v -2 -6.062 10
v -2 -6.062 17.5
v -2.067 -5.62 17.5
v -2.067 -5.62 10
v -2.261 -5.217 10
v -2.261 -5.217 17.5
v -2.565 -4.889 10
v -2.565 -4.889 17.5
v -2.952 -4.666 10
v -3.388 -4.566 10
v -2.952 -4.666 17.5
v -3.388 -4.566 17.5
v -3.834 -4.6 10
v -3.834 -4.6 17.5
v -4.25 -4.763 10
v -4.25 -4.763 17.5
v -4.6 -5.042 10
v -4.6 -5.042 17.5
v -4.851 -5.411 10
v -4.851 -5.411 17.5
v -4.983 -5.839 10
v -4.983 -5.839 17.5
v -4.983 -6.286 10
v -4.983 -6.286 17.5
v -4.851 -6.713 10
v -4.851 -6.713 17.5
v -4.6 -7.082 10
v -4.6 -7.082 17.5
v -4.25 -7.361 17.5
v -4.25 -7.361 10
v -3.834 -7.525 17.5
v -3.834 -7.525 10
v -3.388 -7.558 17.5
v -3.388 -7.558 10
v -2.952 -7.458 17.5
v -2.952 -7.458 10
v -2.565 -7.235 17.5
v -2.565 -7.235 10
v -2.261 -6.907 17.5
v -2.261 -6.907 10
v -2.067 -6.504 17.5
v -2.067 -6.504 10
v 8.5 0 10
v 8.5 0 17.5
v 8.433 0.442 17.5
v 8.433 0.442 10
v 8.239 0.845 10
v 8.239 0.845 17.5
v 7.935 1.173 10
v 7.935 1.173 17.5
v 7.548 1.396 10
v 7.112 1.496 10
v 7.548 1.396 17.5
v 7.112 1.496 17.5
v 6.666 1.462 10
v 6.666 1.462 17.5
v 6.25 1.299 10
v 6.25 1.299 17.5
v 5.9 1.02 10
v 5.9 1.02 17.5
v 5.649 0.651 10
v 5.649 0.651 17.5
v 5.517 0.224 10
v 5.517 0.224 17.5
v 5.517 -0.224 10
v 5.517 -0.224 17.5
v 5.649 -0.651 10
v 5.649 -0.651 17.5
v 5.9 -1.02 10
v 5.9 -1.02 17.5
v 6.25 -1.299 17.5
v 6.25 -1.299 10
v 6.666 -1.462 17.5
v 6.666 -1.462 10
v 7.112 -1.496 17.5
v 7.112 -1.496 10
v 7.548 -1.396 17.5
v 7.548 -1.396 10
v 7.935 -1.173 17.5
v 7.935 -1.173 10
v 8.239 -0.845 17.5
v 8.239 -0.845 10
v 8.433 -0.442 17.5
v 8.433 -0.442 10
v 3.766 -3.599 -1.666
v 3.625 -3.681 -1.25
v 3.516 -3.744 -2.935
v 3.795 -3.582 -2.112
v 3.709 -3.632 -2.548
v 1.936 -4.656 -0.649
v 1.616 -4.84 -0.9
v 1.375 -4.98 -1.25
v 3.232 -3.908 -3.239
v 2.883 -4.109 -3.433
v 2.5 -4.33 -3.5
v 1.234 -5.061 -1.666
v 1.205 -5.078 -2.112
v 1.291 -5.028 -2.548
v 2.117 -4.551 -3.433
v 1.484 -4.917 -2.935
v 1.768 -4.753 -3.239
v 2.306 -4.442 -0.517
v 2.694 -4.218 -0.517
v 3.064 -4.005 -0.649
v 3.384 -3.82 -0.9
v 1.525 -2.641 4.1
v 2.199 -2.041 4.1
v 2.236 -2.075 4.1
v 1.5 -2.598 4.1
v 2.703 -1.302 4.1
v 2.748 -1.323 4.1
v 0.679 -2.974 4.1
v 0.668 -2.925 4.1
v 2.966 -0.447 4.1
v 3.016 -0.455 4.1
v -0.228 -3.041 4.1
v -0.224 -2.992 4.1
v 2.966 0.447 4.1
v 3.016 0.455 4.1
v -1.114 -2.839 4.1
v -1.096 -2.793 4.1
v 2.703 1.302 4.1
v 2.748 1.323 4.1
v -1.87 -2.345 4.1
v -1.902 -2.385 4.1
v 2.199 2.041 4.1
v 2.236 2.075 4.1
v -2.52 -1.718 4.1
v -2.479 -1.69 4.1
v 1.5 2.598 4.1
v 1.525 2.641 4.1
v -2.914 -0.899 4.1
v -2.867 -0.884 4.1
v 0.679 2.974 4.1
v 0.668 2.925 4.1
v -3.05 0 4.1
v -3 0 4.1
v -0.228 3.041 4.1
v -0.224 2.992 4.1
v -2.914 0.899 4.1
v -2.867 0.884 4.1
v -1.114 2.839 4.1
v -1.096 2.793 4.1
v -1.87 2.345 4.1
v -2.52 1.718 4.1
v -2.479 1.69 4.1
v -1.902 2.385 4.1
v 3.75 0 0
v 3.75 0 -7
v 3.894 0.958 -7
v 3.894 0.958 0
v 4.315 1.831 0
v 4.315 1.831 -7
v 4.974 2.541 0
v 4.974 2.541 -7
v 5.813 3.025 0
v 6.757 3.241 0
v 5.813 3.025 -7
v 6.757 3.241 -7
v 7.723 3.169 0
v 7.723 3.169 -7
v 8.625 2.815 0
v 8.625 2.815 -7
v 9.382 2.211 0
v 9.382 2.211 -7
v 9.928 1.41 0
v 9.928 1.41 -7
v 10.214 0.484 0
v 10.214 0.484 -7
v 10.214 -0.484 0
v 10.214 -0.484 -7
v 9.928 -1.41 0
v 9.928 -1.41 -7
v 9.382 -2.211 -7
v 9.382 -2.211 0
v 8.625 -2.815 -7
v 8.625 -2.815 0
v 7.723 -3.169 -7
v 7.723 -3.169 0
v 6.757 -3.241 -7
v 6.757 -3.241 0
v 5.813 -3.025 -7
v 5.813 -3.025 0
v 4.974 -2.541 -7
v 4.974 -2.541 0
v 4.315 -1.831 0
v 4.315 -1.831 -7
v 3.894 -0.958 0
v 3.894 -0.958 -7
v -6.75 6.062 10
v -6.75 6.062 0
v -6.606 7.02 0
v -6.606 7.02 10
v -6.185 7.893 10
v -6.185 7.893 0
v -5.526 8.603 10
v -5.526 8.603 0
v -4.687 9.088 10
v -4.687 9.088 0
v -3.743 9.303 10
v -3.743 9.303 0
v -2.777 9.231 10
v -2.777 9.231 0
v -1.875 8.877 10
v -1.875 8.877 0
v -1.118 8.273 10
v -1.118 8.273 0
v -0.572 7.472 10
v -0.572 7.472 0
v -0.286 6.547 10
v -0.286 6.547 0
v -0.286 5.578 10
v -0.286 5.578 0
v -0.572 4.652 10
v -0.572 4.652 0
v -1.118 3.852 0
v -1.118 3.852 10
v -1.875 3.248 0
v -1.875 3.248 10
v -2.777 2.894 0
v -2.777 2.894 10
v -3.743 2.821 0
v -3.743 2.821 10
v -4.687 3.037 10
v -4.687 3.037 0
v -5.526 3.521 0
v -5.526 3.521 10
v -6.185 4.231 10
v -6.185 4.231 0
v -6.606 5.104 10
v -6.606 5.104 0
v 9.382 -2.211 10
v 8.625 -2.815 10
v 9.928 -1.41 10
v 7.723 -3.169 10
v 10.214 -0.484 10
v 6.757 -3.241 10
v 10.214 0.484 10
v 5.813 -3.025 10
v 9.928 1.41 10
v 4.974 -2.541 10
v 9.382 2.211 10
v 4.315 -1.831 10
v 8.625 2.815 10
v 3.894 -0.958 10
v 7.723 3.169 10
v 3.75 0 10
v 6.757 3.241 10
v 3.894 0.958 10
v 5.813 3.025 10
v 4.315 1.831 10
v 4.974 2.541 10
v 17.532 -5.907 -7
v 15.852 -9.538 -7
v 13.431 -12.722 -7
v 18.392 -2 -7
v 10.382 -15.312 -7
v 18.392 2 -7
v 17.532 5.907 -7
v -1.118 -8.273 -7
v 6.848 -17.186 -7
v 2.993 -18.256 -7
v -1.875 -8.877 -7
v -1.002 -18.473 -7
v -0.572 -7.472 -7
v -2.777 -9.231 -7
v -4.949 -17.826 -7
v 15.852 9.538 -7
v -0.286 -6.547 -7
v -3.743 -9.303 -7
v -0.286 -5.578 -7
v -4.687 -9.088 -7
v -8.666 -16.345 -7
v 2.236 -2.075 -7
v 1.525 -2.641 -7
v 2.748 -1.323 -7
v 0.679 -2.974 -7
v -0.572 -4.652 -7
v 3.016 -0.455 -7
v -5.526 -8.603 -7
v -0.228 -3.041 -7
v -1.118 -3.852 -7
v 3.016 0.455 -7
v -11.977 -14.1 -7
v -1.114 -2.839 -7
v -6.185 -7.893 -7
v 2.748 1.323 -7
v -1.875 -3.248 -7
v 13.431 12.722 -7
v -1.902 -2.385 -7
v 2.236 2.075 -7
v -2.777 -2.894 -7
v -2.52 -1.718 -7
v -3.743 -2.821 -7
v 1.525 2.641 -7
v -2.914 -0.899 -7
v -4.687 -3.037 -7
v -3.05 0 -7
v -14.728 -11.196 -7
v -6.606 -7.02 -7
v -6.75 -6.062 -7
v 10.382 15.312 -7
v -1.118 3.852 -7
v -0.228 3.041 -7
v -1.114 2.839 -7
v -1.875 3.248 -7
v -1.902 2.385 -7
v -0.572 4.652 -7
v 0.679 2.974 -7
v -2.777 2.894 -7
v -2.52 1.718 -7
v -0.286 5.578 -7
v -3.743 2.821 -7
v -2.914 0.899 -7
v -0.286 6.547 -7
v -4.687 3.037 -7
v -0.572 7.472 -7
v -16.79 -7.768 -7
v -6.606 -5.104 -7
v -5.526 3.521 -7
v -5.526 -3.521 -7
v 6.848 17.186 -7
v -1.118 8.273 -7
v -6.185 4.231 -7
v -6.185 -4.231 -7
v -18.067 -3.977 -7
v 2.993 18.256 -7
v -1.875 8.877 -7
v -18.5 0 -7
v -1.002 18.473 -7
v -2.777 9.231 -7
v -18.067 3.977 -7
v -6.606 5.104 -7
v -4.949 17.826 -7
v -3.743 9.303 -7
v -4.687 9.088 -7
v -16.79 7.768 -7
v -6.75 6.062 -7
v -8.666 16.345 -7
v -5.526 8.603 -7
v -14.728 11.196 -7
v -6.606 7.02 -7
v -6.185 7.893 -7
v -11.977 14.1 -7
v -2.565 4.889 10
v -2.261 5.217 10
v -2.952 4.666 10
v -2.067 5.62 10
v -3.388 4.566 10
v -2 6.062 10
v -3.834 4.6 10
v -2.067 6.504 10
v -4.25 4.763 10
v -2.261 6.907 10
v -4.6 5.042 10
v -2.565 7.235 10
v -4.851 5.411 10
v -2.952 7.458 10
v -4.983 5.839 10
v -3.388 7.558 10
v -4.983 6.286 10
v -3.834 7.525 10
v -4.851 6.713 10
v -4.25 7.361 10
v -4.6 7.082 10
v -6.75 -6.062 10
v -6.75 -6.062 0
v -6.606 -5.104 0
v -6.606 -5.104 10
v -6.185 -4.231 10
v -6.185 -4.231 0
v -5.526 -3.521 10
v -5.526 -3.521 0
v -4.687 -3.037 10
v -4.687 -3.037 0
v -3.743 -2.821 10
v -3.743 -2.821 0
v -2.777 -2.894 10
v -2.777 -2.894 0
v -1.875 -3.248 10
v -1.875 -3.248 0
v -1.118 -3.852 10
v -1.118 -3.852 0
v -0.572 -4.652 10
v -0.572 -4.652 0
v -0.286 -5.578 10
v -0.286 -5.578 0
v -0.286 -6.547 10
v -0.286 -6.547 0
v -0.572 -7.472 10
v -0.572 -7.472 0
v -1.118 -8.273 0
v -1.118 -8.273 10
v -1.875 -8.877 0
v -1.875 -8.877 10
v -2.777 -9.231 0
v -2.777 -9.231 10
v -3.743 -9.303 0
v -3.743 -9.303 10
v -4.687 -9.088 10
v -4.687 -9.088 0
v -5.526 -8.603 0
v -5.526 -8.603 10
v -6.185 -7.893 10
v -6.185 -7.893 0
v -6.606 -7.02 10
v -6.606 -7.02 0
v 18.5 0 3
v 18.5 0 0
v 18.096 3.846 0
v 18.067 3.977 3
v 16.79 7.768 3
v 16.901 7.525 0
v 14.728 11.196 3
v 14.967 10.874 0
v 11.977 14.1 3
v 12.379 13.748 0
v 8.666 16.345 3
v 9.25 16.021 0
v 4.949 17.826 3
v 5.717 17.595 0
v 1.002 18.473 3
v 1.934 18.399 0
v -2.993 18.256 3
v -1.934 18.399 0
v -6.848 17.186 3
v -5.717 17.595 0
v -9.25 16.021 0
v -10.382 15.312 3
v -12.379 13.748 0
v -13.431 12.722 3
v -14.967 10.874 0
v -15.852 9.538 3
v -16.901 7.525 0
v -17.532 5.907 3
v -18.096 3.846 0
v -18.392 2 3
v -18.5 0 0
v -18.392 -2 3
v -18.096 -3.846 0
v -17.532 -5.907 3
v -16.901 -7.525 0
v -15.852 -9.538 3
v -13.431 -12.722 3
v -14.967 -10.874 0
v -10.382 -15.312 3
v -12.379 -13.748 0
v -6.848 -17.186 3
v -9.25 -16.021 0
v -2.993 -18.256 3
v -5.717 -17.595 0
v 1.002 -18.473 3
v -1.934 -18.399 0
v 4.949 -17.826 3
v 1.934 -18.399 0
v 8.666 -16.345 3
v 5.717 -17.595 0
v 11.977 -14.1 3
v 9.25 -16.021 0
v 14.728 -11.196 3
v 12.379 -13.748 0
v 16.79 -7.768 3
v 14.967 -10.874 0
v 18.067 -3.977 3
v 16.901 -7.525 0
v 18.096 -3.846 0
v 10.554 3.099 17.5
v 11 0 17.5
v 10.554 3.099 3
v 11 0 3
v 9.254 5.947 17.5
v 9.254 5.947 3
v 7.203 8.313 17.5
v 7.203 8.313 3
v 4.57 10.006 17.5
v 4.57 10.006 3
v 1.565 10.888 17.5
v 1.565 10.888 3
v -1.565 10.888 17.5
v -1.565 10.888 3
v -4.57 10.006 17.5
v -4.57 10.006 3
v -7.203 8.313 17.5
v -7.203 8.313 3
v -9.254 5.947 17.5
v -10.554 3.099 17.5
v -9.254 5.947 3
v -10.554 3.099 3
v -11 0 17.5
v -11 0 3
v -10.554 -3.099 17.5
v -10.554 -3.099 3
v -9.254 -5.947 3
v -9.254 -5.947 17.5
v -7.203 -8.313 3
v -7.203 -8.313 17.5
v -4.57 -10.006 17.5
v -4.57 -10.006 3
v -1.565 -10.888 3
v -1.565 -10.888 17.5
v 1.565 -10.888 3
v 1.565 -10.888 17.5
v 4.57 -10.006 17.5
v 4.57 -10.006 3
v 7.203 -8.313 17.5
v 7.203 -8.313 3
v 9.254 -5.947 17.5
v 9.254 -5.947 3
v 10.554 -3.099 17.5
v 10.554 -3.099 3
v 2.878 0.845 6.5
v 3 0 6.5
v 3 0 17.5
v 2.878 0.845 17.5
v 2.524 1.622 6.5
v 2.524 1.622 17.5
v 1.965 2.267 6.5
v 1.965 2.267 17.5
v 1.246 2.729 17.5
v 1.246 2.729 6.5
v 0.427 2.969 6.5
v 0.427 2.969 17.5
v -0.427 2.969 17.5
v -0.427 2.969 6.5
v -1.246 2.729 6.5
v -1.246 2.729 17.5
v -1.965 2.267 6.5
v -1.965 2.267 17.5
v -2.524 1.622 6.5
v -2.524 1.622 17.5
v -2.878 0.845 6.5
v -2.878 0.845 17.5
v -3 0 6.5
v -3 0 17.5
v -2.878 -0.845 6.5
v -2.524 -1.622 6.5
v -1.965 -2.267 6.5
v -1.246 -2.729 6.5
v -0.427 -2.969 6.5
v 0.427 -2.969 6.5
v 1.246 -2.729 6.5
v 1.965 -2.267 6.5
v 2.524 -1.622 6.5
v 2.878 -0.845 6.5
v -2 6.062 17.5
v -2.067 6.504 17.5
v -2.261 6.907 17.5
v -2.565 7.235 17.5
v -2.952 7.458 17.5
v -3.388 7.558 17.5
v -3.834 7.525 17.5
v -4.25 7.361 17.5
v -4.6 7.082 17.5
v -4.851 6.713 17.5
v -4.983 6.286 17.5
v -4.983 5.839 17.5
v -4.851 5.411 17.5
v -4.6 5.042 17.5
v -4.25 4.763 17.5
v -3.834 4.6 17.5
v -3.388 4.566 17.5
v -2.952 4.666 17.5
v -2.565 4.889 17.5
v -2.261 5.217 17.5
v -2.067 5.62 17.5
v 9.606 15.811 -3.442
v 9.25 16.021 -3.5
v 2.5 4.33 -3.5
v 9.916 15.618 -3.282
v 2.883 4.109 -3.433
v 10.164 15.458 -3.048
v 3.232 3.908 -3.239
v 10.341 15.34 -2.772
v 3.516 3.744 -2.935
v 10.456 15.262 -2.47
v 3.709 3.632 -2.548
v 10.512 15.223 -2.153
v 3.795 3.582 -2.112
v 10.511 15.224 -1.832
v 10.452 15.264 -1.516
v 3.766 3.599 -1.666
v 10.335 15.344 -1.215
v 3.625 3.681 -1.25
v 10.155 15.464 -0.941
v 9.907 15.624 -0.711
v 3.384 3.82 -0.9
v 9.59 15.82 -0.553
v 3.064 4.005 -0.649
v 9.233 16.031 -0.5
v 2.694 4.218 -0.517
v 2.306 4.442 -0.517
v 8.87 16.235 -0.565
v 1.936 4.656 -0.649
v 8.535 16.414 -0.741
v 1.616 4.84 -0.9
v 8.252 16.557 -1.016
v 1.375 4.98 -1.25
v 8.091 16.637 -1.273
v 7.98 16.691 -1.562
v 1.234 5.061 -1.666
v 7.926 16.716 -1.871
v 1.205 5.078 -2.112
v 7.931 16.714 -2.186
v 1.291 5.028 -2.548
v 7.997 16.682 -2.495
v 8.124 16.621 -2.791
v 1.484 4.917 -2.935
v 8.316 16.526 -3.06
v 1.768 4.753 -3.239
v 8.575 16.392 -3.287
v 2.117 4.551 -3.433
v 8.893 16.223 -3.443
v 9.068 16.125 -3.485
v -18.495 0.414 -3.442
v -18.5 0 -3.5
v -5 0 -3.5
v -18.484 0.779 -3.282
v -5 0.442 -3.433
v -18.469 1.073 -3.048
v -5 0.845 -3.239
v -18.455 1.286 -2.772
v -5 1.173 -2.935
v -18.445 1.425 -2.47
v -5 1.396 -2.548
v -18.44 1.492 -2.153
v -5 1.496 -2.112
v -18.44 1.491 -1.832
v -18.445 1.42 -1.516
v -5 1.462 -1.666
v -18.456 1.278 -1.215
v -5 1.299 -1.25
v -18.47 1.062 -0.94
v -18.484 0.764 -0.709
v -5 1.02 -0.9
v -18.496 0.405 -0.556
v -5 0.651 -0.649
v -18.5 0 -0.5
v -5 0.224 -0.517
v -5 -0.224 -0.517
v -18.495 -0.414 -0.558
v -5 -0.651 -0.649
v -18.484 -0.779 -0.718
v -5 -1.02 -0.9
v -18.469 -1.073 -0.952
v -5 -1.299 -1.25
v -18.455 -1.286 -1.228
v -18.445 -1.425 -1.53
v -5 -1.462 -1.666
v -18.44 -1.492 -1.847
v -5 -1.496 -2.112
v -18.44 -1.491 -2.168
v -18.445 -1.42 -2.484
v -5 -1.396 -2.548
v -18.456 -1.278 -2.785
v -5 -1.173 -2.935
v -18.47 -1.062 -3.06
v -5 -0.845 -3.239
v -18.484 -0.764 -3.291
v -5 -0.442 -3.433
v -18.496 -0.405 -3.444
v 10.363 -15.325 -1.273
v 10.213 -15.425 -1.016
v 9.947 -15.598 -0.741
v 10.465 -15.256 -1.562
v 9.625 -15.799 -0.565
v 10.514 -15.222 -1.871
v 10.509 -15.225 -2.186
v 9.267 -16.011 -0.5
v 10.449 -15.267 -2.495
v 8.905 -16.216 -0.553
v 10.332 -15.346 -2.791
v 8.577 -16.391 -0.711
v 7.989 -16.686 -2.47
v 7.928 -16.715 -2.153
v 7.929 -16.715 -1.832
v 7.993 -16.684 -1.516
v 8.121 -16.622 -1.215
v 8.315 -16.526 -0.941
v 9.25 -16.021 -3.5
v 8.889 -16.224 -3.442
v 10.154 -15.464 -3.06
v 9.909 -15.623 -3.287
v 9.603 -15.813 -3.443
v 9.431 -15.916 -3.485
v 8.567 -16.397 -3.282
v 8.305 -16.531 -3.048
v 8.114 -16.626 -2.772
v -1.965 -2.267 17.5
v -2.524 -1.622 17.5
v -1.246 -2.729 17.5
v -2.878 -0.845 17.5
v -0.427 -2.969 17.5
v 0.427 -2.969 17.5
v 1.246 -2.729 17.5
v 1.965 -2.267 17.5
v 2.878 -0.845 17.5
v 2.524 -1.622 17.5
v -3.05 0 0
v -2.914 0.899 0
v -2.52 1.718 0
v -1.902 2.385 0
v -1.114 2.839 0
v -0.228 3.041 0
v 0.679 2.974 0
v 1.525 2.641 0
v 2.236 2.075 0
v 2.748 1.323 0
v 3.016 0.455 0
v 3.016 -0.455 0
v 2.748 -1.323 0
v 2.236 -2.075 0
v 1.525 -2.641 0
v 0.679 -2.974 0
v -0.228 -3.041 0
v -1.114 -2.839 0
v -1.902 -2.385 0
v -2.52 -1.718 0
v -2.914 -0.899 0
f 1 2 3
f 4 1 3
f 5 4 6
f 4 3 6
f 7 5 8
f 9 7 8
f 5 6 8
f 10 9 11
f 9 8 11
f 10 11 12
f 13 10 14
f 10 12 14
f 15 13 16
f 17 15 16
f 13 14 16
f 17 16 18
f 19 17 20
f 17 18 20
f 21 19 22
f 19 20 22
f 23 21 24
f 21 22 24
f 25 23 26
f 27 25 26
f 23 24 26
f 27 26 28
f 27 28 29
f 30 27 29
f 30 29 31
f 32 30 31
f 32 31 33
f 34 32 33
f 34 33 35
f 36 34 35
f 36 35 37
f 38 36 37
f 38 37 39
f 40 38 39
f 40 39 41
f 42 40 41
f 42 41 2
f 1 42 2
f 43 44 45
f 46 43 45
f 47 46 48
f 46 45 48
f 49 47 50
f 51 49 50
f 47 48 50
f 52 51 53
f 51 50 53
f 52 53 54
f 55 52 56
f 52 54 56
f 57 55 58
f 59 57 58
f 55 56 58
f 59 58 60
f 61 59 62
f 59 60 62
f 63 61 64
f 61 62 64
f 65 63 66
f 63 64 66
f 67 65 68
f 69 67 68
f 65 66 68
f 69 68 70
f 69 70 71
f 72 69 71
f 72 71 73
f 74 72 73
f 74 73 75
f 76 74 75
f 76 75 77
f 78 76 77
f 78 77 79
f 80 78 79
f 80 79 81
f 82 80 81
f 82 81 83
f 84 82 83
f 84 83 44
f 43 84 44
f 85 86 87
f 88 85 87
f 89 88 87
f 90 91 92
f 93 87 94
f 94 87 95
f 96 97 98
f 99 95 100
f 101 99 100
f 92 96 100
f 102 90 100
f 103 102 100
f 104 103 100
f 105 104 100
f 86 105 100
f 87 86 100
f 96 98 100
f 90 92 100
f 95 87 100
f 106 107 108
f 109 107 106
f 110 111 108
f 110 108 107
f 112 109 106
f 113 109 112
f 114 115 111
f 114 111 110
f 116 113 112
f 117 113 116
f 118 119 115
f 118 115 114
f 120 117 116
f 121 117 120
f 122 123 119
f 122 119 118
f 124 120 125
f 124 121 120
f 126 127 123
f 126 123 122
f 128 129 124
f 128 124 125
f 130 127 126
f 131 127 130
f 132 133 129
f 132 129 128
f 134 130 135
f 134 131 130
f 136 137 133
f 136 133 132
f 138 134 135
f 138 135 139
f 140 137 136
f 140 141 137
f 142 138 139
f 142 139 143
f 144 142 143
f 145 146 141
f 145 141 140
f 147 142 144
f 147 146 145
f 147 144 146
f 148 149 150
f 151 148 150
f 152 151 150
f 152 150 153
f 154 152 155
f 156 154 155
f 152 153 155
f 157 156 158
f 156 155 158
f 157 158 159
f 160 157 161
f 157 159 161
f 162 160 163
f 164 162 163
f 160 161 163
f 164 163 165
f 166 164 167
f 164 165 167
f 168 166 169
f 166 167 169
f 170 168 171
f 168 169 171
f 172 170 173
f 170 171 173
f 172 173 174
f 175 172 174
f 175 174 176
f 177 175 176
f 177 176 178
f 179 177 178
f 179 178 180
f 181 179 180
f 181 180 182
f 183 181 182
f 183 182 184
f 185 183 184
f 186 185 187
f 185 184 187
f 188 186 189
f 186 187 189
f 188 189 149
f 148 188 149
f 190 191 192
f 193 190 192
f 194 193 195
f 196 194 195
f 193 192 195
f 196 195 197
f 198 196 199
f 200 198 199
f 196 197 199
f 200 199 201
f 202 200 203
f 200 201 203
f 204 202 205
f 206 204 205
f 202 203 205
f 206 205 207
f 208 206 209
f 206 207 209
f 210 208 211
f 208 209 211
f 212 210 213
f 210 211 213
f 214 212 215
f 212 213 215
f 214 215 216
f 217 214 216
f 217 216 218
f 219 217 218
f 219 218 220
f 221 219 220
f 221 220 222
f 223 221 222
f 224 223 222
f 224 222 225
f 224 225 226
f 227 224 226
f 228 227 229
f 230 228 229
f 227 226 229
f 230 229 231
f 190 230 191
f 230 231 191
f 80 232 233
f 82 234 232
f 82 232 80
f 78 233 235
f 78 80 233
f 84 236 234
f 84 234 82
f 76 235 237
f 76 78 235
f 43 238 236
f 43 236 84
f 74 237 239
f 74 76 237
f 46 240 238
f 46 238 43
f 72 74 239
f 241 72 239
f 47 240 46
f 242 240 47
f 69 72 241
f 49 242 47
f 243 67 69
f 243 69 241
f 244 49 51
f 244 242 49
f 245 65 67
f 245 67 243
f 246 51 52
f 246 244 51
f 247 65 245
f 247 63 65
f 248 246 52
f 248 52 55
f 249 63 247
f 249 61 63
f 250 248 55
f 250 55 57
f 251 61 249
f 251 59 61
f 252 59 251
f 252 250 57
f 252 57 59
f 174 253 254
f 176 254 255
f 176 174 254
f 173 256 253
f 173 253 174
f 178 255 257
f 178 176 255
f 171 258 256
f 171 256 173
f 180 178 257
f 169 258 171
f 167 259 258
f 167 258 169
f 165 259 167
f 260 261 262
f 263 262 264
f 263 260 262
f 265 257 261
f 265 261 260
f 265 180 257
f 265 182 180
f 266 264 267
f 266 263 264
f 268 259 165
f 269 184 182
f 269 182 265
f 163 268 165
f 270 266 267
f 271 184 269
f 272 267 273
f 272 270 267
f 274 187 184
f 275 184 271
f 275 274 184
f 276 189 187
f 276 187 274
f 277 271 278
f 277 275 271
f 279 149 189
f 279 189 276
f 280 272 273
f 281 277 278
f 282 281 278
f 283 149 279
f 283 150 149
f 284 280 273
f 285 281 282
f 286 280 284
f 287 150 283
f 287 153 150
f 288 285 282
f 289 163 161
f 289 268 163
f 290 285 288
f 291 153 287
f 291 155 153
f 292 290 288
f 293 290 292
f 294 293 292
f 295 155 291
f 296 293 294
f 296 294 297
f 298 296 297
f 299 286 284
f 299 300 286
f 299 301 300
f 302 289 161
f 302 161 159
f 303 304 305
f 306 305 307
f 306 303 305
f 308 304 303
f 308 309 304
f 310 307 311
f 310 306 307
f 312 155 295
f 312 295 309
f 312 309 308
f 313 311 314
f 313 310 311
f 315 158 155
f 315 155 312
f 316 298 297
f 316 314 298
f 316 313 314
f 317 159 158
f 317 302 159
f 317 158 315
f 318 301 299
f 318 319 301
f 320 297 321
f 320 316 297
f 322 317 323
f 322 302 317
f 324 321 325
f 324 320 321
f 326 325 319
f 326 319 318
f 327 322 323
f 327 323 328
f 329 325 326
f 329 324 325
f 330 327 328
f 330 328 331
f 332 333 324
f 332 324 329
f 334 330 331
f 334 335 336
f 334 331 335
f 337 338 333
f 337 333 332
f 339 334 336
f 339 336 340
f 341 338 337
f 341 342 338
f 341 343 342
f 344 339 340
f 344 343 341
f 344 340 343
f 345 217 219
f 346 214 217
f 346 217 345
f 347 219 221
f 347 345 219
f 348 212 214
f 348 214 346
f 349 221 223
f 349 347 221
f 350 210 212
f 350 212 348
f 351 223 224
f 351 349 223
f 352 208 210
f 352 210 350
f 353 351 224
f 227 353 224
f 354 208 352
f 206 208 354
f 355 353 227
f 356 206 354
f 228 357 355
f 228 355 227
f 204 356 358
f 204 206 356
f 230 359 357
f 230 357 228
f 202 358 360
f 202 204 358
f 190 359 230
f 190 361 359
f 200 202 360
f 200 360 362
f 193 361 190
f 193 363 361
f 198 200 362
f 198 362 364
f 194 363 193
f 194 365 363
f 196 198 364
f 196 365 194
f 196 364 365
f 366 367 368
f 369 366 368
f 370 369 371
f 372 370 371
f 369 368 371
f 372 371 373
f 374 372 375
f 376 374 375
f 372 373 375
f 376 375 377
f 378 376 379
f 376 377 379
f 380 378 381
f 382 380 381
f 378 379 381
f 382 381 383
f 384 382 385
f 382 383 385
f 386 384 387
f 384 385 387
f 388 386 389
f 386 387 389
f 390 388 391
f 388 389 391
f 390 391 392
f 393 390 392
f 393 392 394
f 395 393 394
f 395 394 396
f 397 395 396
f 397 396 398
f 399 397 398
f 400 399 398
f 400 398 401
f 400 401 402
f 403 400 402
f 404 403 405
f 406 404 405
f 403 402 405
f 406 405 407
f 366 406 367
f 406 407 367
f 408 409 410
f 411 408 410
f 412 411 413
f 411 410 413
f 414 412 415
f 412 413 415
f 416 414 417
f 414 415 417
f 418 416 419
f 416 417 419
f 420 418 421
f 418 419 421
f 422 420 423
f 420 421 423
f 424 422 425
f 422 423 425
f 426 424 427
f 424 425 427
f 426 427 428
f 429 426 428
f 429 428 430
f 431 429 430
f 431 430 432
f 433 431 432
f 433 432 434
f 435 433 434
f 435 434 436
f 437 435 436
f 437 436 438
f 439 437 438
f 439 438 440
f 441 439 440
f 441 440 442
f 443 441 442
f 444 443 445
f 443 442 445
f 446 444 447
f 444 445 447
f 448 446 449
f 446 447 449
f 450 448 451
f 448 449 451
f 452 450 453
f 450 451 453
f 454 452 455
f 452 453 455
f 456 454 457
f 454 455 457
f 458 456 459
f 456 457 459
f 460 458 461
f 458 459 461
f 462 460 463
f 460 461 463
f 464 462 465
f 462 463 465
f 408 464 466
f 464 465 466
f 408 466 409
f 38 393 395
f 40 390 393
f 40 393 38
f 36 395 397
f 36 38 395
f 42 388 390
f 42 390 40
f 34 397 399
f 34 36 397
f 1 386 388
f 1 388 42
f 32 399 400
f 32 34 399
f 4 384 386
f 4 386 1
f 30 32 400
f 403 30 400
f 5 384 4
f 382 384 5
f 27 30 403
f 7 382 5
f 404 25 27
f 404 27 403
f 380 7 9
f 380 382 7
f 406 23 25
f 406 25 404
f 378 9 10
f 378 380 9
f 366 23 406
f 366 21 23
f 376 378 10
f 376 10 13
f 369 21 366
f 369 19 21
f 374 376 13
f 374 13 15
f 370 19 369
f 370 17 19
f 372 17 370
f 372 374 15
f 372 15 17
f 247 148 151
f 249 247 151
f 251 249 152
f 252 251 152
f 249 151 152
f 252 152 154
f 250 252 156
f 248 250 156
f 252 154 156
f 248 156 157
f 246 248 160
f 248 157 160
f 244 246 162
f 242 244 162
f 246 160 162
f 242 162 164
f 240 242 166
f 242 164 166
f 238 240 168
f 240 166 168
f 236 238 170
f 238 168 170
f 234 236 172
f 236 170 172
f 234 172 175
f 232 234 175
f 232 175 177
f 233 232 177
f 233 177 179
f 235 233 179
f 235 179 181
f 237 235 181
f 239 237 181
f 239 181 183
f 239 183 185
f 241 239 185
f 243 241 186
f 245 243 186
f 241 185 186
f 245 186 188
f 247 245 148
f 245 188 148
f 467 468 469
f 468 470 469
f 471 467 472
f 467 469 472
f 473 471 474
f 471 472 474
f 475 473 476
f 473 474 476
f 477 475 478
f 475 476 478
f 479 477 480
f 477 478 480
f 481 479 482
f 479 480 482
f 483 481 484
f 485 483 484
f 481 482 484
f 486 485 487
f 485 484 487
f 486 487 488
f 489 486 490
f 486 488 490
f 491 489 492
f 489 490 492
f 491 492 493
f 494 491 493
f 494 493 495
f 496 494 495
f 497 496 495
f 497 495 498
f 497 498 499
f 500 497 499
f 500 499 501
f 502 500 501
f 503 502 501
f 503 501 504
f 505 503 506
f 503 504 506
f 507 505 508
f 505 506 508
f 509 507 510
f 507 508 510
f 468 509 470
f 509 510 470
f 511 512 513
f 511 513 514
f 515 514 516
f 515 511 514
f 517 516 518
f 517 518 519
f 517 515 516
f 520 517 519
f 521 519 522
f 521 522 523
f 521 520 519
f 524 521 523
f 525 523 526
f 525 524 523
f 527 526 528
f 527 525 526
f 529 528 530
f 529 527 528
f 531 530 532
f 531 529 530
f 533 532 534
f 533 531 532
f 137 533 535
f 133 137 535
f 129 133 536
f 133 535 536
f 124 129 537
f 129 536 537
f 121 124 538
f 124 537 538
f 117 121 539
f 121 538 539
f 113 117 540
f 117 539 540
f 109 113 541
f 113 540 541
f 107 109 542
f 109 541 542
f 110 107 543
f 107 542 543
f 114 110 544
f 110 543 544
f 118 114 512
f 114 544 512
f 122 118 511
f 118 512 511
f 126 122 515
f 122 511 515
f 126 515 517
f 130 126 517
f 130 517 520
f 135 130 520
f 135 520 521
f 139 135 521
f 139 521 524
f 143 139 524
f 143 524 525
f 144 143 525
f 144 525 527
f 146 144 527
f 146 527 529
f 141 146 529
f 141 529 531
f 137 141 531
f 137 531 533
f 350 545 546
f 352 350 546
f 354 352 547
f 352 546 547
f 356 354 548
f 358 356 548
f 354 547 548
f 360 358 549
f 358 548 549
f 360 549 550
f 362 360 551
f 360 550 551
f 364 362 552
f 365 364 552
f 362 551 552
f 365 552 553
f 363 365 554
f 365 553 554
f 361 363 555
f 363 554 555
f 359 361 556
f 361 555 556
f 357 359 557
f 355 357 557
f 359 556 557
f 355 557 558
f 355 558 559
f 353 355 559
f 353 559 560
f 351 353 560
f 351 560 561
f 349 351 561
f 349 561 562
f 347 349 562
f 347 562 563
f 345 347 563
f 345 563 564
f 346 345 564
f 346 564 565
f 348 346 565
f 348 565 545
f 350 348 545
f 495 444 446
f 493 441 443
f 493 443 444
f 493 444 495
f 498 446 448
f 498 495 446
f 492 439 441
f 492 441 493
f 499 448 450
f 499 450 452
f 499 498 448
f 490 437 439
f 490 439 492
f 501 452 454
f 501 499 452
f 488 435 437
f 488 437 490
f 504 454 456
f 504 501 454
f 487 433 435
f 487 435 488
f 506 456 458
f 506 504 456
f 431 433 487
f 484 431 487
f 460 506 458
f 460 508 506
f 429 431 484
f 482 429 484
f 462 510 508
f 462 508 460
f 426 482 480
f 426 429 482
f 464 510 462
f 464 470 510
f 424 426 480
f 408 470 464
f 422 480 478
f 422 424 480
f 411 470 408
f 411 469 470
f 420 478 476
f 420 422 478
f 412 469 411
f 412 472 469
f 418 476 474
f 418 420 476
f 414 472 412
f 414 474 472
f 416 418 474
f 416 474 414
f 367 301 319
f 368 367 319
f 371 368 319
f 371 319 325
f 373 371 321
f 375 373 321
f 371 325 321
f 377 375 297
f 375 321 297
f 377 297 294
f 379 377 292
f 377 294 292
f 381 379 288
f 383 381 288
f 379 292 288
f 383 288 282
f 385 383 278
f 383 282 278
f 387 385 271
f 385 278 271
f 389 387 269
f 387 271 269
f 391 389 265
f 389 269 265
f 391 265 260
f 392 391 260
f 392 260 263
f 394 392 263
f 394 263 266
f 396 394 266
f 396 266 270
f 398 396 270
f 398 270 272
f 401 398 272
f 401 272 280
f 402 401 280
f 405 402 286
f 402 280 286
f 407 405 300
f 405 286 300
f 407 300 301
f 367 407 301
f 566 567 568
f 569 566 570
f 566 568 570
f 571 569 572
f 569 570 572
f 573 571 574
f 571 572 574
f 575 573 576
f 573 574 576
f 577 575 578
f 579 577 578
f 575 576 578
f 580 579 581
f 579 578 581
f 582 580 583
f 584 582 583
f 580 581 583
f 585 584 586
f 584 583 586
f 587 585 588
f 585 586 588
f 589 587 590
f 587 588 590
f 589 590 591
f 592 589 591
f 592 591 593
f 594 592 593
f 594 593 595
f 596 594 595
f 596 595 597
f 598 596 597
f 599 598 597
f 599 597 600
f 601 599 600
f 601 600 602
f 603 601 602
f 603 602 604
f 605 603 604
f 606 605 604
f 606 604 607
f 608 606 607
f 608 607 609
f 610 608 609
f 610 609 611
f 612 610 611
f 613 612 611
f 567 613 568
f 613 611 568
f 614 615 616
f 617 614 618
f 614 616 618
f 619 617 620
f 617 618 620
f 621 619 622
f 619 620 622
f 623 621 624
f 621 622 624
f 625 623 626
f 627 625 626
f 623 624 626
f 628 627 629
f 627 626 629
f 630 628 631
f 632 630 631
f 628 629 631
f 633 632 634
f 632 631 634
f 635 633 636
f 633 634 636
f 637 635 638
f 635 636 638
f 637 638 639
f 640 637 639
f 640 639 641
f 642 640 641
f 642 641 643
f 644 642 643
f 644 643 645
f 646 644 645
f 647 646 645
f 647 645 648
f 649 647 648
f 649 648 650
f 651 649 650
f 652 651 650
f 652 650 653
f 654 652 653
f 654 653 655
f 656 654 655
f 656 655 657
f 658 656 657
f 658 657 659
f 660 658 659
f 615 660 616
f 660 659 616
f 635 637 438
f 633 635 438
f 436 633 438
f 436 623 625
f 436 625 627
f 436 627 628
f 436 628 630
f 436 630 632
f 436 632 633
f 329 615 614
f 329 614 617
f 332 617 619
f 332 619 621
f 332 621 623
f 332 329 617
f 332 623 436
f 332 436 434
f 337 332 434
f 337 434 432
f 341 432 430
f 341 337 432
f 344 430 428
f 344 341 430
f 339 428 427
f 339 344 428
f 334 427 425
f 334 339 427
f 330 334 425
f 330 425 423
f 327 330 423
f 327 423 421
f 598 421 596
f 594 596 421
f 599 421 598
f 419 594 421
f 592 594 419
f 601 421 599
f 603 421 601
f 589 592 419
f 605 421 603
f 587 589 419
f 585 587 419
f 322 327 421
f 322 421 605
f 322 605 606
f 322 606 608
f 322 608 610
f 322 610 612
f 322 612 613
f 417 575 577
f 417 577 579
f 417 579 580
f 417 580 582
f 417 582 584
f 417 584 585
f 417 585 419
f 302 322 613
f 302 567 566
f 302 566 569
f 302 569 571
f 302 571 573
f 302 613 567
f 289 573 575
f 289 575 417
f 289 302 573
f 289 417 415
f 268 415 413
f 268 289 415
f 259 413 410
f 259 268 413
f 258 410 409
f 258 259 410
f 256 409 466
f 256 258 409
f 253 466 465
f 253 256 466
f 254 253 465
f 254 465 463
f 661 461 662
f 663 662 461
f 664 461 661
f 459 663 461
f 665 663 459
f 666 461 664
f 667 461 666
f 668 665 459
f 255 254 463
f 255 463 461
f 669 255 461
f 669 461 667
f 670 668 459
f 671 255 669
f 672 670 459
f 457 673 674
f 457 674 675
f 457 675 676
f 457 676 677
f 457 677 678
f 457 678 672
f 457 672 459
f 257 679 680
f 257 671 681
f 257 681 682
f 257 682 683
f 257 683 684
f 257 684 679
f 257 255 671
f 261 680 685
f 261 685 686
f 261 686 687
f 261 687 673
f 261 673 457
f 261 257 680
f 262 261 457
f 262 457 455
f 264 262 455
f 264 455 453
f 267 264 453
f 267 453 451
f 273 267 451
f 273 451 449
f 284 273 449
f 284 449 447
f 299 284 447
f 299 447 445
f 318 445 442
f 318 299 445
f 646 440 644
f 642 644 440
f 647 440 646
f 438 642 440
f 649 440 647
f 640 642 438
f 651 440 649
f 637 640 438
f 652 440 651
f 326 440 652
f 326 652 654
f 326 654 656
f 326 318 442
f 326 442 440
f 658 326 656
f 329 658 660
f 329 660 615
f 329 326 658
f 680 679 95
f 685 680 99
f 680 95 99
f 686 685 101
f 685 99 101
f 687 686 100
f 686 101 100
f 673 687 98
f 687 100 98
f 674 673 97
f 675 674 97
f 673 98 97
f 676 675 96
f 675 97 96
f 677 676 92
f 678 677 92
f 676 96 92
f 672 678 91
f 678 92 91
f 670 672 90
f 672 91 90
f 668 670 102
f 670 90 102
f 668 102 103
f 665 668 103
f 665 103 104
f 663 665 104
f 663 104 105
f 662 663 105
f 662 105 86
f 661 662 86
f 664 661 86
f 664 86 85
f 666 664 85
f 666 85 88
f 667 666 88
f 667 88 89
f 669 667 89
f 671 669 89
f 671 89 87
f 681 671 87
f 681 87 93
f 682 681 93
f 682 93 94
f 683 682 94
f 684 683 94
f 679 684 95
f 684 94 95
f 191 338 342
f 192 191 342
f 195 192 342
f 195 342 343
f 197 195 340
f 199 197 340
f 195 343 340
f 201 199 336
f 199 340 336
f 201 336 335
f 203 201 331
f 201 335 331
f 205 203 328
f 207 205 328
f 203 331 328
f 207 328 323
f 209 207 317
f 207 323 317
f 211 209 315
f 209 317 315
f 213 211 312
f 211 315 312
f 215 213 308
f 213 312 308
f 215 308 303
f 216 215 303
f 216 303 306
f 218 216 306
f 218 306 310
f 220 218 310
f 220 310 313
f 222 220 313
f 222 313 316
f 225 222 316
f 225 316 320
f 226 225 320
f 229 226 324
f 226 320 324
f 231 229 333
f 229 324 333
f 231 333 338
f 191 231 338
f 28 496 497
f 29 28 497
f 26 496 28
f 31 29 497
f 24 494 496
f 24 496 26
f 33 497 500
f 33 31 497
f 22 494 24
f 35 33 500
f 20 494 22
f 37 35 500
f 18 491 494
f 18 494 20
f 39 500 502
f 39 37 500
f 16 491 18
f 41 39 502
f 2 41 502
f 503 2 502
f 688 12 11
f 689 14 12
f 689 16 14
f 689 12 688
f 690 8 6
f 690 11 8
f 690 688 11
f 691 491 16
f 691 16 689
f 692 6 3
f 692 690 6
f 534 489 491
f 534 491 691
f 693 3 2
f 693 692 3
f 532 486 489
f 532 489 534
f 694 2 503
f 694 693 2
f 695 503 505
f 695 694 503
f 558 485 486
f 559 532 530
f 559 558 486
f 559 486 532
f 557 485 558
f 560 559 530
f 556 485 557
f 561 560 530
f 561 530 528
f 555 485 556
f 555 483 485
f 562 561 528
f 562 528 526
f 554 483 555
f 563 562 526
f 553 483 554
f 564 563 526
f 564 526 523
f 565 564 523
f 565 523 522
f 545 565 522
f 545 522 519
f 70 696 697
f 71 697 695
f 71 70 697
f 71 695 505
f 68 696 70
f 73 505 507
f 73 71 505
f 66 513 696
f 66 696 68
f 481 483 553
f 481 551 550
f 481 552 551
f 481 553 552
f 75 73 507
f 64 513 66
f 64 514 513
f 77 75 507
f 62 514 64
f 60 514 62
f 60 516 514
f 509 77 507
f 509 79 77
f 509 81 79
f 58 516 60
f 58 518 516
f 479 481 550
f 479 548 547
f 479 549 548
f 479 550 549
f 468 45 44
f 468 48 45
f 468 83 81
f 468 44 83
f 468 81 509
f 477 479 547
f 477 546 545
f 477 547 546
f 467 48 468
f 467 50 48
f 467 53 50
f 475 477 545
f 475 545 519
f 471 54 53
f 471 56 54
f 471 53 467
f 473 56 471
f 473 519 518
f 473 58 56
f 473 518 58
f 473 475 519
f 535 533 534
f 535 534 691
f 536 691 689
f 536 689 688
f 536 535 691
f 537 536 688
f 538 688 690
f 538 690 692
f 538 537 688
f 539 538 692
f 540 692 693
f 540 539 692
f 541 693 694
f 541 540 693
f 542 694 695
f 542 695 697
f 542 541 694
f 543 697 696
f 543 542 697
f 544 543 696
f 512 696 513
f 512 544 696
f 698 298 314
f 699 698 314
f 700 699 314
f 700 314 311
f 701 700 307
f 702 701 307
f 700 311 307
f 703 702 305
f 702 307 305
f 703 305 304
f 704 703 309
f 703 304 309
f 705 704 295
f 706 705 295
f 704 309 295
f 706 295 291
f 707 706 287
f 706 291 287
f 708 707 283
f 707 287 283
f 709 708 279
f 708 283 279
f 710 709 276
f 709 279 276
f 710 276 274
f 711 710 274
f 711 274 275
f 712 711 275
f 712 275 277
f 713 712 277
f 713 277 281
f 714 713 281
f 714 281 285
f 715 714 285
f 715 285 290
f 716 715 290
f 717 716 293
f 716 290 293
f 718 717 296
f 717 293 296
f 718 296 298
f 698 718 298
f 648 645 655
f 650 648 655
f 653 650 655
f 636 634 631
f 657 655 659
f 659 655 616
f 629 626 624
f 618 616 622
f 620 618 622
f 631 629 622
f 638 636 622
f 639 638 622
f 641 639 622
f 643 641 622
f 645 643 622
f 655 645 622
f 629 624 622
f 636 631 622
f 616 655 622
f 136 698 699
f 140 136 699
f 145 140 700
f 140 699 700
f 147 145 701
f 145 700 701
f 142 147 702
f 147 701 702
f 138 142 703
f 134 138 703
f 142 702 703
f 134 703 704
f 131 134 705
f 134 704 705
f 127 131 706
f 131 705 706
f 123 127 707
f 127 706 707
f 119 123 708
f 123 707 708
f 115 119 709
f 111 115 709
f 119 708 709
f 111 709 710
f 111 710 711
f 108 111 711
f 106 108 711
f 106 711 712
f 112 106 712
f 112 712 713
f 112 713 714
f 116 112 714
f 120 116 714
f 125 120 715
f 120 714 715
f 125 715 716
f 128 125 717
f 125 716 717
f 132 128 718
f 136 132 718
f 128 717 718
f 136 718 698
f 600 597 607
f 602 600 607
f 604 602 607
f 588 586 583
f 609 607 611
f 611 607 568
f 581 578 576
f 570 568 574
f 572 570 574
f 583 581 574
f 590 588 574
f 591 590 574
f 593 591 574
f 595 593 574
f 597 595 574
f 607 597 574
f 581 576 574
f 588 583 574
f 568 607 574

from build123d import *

# Parameters (mm, degrees)
SKETCH1_R           = 18.5
BOSS_EXTRUDE1_DEPTH = 3
SKETCH2_R           = 11
BOSS_EXTRUDE2_DEPTH = 3.5
SKETCH4_R           = 3.05
CUT_EXTRUDE1_DEPTH  = 4.1
SKETCH5_R           = 1.5
CUT_EXTRUDE2_DEPTH  = 4
SKETCH7_R           = 11
SKETCH7_R_2         = 3
BOSS_EXTRUDE3_DEPTH = 11
SKETCH9_R           = 1.5
CUT_EXTRUDE4_DEPTH  = 32.476181471
SKETCH10_R          = 3
CUT_EXTRUDE5_DEPTH  = 32.476181471
SKETCH11_R          = 3.25
CUT_EXTRUDE8_DEPTH  = 10
BOSS_EXTRUDE4_START = 7
SKETCH12_R          = 18.5
SKETCH12_R_2        = 3.25
SKETCH12_R_3        = 3.05
BOSS_EXTRUDE4_DEPTH = 7
CUT_EXTRUDE9_START  = -5
SKETCH13_R          = 1.5
CUT_EXTRUDE9_DEPTH  = 17
CIRPATTERN1_COUNT   = 3


with BuildPart() as part:
    # Sketch1 → Boss-Extrude1 (new body)
    with BuildSketch(Plane.XY):
        Circle(SKETCH1_R)
    extrude(amount=BOSS_EXTRUDE1_DEPTH)

    # Sketch2 → Boss-Extrude2 (add)
    with BuildSketch(Plane.XY.offset(3)):
        Circle(SKETCH2_R)
    extrude(amount=BOSS_EXTRUDE2_DEPTH)

    # Sketch4 → Cut-Extrude1 (cut)
    with BuildSketch(Plane(origin=(0, 0, 0), x_dir=(-1, 0, 0), z_dir=(0, 0, -1))):
        Circle(SKETCH4_R)
    extrude(amount=-CUT_EXTRUDE1_DEPTH, mode=Mode.SUBTRACT)

    # Sketch5 → Cut-Extrude2 (cut)
    with BuildSketch(Plane(origin=(0, 0, 4.1), x_dir=(-1, 0, 0), z_dir=(0, 0, -1))):
        Circle(SKETCH5_R)
    extrude(amount=-CUT_EXTRUDE2_DEPTH, mode=Mode.SUBTRACT)

    # Sketch7 → Boss-Extrude3 (add)
    with BuildSketch(Plane.XY.offset(6.5)):
        Circle(SKETCH7_R)
        Circle(SKETCH7_R_2, mode=Mode.SUBTRACT)
    extrude(amount=BOSS_EXTRUDE3_DEPTH)

    # Sketch9 → Cut-Extrude4 (cut, through all)
    with BuildSketch(Plane.XY.offset(17.5)):
        with Locations((7, 0)):
            Circle(SKETCH9_R)
        with Locations((-3.5, -6.062177826)):
            Circle(SKETCH9_R)
        with Locations((-3.5, 6.062177826)):
            Circle(SKETCH9_R)
    extrude(amount=-CUT_EXTRUDE4_DEPTH, mode=Mode.SUBTRACT)

    # Sketch10 → Cut-Extrude5 (cut, through all)
    with BuildSketch(Plane.XY.offset(17.5)):
        Circle(SKETCH10_R)
    extrude(amount=-CUT_EXTRUDE5_DEPTH, mode=Mode.SUBTRACT)

    # Sketch11 → Cut-Extrude8 (cut)
    with BuildSketch(Plane(origin=(0, 0, 0), x_dir=(-1, 0, 0), z_dir=(0, 0, -1))):
        with Locations((3.5, -6.062177826)):
            Circle(SKETCH11_R)
        with Locations((3.5, 6.062177826)):
            Circle(SKETCH11_R)
        with Locations((-7, 0)):
            Circle(SKETCH11_R)
    extrude(amount=-CUT_EXTRUDE8_DEPTH, mode=Mode.SUBTRACT)

    # Sketch12 → Boss-Extrude4 (add)
    with BuildSketch(Plane(origin=(0, 0, 0), x_dir=(-1, 0, 0), z_dir=(0, 0, -1)).offset(BOSS_EXTRUDE4_START)):
        Circle(SKETCH12_R)
        with Locations((3.5, 6.062177826)):
            Circle(SKETCH12_R_2, mode=Mode.SUBTRACT)
        with Locations((3.5, -6.062177826)):
            Circle(SKETCH12_R_2, mode=Mode.SUBTRACT)
        with Locations((-7, 0)):
            Circle(SKETCH12_R_2, mode=Mode.SUBTRACT)
        Circle(SKETCH12_R_3, mode=Mode.SUBTRACT)
    extrude(amount=-BOSS_EXTRUDE4_DEPTH)

    # Sketch13 → Cut-Extrude9 (cut)
    with BuildSketch(Plane(origin=(0, 0, 0), x_dir=(0, 0, -1), z_dir=(1, 0, 0)).offset(CUT_EXTRUDE9_START)):
        with Locations((2, 0)):
            Circle(SKETCH13_R)
    cut_extrude9 = extrude(amount=-CUT_EXTRUDE9_DEPTH, mode=Mode.SUBTRACT)

    # CirPattern1: Cut-Extrude9 ×3 about axis
    cirpattern1_axis = Axis((0, 0, 3), (0, 0, -1))
    for i in range(1, CIRPATTERN1_COUNT):
        add(cut_extrude9.rotate(cirpattern1_axis, i * 360 / CIRPATTERN1_COUNT), mode=Mode.SUBTRACT)


solid = part.part
